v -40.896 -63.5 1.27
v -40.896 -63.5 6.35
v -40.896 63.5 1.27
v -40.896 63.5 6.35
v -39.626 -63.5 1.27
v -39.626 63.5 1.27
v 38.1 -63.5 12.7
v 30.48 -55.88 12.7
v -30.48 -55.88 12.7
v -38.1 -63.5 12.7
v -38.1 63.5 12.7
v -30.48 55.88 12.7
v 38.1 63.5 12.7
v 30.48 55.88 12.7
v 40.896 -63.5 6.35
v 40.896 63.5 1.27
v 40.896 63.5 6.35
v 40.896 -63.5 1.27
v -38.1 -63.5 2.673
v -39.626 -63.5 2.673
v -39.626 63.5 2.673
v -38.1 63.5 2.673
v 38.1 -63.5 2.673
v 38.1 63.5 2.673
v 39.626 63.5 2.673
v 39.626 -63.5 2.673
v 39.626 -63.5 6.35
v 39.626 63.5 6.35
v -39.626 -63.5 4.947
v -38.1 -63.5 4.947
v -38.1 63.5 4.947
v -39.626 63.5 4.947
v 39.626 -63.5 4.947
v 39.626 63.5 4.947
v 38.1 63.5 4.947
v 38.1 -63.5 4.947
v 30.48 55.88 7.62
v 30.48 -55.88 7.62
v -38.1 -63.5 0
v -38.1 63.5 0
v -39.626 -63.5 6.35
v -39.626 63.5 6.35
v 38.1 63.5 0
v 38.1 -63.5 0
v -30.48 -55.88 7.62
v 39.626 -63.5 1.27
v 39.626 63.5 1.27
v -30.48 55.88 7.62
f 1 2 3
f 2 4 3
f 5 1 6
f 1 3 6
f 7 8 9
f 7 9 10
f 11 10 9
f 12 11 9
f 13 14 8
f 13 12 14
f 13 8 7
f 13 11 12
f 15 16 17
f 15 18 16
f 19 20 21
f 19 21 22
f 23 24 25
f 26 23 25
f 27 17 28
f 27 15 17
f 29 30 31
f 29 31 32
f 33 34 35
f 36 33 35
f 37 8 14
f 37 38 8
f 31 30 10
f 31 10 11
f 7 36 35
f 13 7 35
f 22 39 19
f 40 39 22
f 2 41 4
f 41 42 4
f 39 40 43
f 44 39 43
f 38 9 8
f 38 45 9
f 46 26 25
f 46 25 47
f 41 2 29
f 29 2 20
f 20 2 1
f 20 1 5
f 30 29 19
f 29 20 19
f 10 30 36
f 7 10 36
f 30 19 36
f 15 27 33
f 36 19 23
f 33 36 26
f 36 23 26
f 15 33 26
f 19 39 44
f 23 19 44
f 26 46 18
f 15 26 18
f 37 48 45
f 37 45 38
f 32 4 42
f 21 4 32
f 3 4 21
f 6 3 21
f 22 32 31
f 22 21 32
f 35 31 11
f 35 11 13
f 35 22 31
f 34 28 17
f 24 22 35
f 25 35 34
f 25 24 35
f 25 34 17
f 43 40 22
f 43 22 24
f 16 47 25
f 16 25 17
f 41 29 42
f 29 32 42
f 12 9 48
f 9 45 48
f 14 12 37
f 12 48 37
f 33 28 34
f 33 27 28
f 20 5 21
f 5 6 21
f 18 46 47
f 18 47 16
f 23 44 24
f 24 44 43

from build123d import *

# Parameters (mm, degrees)
F0_W     = 76.2
F0_H     = 127
F1_DEPTH = 12.7
F2_T     = -7.62
F4_DEPTH = 63.5


with BuildPart() as f1:
    # F0 (on Top) → F1 (new body)
    with BuildSketch(Plane.XY):
        Rectangle(F0_W, F0_H)
    extrude(amount=F1_DEPTH)

    # F2
    f2_openings = [f1.faces().sort_by_distance(p)[0] for p in [
        (0, 0, 12.7),
    ]]
    offset(amount=F2_T, openings=f2_openings)

    # F3 (on Front) → F4 (join, symmetric)
    with BuildSketch(Plane.XZ):
        Polygon((-38.1, 4.947344), (-39.625825, 4.947344), (-39.625825, 2.672656), (-38.1, 2.672656), (-38.1, 3.81), align=None)
        Polygon((-39.625825, 2.672656), (-39.625825, 4.947344), (-39.625825, 6.35), (-40.895825, 6.35), (-40.895825, 1.27), (-39.625825, 1.27), align=None)
        Polygon((39.625825, 6.35), (39.625825, 4.947344), (39.625825, 2.672656), (39.625825, 1.27), (40.895825, 1.27), (40.895825, 6.35), align=None)
        Polygon((39.625825, 2.672656), (39.625825, 4.947344), (38.1, 4.947344), (38.1, 3.81), (38.1, 2.672656), align=None)
    extrude(amount=F4_DEPTH, both=True)


solid = f1.part
